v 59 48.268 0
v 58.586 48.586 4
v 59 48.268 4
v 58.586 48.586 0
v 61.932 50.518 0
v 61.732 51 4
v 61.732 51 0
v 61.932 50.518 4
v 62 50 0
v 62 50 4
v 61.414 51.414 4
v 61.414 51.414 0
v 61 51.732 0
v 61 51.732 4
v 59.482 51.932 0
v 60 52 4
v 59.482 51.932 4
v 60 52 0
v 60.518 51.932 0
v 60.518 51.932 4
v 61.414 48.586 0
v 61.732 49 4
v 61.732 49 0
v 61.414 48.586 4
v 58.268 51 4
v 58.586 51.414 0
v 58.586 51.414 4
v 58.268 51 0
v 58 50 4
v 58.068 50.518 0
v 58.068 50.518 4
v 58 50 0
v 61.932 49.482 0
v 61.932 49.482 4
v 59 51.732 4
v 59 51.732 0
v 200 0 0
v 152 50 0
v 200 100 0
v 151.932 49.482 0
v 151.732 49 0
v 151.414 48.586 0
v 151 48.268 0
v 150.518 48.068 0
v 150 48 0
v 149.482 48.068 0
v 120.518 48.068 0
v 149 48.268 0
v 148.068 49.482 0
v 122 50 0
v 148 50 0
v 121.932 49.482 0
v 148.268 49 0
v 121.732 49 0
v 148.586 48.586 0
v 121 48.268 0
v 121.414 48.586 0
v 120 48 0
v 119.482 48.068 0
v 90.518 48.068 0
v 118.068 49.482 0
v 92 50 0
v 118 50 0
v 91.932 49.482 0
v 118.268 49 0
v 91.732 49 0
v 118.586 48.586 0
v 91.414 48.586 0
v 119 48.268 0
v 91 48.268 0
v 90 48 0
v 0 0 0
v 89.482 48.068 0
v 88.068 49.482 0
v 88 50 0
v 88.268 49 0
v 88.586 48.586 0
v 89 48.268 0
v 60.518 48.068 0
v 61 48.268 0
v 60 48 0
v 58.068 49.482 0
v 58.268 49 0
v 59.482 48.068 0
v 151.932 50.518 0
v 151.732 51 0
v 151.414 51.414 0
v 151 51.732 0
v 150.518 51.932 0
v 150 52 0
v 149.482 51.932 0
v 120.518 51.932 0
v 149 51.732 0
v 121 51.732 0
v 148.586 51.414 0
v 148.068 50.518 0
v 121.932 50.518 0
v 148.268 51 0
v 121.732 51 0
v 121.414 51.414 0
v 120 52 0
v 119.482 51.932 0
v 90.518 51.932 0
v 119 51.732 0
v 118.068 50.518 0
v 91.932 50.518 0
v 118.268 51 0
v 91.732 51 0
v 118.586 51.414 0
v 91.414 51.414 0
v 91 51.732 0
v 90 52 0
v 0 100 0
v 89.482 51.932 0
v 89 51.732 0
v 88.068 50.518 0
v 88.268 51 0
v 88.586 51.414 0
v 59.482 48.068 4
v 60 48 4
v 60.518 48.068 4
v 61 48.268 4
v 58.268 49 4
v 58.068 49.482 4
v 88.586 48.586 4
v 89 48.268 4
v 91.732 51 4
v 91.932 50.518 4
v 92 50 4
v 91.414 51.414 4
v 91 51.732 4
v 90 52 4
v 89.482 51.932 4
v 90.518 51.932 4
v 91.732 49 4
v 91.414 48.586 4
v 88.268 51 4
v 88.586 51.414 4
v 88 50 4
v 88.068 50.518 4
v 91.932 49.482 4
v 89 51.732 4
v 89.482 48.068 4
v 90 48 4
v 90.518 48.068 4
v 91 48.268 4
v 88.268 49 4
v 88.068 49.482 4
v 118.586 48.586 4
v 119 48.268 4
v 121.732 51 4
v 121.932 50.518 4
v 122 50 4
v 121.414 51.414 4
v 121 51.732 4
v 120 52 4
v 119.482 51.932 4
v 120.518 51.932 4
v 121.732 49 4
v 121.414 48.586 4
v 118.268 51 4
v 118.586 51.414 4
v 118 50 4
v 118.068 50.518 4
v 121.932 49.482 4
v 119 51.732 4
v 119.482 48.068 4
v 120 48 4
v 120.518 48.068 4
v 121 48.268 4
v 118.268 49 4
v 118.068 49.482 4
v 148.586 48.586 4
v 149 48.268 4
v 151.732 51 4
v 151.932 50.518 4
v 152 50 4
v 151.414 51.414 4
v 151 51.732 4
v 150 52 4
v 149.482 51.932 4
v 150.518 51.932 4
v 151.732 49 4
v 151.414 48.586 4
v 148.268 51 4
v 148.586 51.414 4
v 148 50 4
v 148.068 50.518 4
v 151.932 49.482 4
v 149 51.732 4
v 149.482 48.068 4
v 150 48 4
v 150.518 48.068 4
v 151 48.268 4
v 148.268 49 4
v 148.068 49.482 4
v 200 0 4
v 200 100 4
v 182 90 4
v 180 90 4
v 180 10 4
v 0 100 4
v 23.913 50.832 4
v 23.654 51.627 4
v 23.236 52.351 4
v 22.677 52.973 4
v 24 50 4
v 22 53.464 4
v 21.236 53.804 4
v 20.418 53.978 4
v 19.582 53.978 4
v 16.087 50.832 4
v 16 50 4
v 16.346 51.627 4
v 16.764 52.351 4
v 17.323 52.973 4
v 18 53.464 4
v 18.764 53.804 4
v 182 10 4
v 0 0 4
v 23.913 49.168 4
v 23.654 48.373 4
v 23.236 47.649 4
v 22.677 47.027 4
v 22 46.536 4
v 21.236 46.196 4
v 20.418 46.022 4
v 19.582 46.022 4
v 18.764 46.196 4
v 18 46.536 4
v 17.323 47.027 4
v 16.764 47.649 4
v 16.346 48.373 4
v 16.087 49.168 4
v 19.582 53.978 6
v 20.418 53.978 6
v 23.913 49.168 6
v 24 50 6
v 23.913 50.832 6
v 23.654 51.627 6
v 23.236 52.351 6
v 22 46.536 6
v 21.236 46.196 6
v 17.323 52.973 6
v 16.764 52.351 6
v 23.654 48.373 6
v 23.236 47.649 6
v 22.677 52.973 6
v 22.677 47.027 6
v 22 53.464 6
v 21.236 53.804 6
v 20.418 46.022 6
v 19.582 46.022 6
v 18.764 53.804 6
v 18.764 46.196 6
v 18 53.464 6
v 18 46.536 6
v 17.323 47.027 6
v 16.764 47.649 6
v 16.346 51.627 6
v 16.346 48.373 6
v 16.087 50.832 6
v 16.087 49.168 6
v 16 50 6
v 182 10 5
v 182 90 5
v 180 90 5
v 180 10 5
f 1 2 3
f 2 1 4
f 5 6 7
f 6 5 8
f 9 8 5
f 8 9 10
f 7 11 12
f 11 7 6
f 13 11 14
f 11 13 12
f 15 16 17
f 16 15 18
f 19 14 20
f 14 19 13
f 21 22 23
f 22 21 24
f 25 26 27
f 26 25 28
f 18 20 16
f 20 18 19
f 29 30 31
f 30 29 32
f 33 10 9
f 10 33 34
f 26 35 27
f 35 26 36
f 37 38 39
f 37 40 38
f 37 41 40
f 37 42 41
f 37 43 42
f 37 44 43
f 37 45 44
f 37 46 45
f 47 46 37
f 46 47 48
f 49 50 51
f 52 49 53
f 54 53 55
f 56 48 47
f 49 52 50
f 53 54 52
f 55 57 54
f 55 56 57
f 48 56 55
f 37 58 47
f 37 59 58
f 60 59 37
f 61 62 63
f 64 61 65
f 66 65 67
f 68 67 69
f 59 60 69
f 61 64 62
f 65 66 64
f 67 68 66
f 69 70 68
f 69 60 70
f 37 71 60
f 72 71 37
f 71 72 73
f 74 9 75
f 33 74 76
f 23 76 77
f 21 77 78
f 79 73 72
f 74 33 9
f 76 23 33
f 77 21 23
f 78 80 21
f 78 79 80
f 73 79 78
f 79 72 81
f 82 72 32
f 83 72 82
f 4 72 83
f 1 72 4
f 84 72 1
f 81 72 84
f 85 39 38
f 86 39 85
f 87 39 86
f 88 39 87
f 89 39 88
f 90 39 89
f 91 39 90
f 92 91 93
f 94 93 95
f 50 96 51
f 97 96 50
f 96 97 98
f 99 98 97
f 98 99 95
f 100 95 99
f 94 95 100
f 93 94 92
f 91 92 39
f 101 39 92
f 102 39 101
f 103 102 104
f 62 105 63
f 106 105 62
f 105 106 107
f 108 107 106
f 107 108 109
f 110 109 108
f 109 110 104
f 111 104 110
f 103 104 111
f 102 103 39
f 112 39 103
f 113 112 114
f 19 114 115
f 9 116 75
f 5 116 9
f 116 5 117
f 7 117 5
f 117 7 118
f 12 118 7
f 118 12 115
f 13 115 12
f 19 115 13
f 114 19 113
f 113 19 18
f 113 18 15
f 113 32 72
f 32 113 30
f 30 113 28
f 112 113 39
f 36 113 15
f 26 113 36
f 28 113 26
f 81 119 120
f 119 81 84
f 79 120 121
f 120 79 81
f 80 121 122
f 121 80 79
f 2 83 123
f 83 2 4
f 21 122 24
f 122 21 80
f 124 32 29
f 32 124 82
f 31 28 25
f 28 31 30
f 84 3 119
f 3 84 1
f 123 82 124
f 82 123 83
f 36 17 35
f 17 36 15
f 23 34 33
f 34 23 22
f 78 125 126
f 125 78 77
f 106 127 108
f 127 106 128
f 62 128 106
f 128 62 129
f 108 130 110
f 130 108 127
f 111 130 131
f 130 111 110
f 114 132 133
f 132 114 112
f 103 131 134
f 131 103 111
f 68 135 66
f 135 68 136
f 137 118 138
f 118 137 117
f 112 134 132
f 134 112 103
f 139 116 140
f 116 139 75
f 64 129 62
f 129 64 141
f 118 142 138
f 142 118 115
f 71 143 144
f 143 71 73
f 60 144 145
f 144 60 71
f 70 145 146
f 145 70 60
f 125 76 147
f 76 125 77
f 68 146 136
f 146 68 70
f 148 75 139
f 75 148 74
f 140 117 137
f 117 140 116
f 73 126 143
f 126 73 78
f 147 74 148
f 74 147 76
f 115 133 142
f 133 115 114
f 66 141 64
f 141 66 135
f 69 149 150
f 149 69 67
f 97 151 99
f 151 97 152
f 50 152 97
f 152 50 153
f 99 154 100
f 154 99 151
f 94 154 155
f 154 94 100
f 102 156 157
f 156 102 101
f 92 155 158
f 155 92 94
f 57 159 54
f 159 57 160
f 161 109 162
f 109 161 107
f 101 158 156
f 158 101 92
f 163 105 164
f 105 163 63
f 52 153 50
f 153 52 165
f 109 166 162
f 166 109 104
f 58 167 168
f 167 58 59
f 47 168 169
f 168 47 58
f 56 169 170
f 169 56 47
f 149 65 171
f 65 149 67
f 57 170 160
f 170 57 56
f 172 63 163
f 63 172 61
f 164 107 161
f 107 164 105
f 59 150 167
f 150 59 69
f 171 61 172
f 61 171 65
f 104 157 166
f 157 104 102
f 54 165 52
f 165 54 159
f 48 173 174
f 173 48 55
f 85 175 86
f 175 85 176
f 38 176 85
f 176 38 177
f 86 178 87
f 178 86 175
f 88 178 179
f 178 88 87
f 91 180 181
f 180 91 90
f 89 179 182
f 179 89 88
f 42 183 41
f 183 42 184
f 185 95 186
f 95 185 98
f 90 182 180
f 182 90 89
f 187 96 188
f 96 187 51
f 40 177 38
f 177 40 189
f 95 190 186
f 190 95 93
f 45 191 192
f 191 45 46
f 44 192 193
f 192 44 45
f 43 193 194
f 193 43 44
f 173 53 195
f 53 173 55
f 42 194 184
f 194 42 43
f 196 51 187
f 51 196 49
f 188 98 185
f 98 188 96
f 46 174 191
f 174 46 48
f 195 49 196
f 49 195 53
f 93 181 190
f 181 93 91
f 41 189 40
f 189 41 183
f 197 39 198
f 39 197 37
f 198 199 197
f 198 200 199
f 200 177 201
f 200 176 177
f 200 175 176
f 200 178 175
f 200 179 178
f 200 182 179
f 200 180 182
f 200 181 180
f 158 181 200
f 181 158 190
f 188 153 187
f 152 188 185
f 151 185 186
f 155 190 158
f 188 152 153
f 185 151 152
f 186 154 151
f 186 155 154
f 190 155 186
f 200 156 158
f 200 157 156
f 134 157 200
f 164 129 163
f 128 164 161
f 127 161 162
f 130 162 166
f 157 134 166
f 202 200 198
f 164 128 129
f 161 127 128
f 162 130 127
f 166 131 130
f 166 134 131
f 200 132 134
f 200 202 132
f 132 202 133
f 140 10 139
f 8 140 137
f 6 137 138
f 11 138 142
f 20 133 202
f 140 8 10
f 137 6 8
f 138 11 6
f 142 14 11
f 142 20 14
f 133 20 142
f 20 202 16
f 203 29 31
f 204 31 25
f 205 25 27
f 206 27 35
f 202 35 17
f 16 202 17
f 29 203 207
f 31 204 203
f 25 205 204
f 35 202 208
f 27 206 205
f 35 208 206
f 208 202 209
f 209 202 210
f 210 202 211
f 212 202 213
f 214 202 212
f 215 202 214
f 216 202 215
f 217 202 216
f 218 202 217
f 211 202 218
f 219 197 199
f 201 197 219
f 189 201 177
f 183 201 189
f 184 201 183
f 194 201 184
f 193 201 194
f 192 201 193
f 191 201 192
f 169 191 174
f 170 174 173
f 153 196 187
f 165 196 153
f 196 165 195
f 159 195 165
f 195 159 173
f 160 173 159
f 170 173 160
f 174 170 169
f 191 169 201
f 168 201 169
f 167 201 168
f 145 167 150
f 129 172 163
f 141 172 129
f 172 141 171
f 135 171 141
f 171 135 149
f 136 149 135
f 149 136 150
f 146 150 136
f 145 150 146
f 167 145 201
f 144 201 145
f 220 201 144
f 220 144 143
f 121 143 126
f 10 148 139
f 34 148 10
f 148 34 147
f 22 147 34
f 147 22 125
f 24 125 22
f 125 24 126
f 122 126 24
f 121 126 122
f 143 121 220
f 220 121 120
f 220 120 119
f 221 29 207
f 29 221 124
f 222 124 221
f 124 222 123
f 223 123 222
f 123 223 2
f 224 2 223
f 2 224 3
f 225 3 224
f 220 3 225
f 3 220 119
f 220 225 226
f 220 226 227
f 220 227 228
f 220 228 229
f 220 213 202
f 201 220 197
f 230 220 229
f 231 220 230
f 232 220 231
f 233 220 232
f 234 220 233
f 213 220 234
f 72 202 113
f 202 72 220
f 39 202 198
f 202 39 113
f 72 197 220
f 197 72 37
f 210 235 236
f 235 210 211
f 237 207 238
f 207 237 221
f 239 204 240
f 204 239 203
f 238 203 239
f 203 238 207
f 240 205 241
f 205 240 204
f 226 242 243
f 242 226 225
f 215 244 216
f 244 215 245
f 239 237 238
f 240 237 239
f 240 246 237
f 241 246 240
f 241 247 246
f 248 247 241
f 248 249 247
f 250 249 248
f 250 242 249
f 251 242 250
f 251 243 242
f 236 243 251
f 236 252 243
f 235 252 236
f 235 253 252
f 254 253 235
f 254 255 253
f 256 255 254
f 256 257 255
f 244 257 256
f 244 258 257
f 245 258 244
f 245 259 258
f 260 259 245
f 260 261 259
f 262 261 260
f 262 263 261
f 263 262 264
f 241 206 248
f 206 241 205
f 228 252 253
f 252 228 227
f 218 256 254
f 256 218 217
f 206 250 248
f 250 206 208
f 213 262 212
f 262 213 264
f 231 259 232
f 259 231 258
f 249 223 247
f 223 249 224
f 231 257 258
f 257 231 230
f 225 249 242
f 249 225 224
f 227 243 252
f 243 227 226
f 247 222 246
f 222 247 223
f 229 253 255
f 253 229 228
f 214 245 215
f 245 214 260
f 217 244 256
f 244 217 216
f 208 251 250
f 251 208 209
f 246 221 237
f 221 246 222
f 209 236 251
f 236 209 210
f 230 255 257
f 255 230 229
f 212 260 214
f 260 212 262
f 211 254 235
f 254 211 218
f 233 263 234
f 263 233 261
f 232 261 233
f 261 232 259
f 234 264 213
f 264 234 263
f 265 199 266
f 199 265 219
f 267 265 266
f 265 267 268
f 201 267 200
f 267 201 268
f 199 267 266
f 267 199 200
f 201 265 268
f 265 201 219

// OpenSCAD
/*
Title: Arm Torque Geometry Board
Folder: 17_robotics_applications
Physics Topic: Lever arms in robot mechanisms
Difficulty: Beginner-Intermediate
Print Type: FDM, single material
Teaches: Conceptual mechanics
Use Case: Classroom manipulative
*/


// --------------------
// Parameters
// --------------------
board_w = 200;
board_h = 100;
thickness = 4;
arm_lengths = [40,70,100,130];

module arm_torque_board(){
    difference(){
        cube([board_w,board_h,thickness]);
        for(l=arm_lengths) translate([20+l,board_h/2,0]) cylinder(h=thickness+0.1,d=4,$fn=24);
    }
    translate([20,board_h/2,thickness]) cylinder(h=2,d=8,$fn=30); // pivot
    translate([board_w-20,10,thickness]) cube([2,80,1]); // gravity direction marker line
}
arm_torque_board();
